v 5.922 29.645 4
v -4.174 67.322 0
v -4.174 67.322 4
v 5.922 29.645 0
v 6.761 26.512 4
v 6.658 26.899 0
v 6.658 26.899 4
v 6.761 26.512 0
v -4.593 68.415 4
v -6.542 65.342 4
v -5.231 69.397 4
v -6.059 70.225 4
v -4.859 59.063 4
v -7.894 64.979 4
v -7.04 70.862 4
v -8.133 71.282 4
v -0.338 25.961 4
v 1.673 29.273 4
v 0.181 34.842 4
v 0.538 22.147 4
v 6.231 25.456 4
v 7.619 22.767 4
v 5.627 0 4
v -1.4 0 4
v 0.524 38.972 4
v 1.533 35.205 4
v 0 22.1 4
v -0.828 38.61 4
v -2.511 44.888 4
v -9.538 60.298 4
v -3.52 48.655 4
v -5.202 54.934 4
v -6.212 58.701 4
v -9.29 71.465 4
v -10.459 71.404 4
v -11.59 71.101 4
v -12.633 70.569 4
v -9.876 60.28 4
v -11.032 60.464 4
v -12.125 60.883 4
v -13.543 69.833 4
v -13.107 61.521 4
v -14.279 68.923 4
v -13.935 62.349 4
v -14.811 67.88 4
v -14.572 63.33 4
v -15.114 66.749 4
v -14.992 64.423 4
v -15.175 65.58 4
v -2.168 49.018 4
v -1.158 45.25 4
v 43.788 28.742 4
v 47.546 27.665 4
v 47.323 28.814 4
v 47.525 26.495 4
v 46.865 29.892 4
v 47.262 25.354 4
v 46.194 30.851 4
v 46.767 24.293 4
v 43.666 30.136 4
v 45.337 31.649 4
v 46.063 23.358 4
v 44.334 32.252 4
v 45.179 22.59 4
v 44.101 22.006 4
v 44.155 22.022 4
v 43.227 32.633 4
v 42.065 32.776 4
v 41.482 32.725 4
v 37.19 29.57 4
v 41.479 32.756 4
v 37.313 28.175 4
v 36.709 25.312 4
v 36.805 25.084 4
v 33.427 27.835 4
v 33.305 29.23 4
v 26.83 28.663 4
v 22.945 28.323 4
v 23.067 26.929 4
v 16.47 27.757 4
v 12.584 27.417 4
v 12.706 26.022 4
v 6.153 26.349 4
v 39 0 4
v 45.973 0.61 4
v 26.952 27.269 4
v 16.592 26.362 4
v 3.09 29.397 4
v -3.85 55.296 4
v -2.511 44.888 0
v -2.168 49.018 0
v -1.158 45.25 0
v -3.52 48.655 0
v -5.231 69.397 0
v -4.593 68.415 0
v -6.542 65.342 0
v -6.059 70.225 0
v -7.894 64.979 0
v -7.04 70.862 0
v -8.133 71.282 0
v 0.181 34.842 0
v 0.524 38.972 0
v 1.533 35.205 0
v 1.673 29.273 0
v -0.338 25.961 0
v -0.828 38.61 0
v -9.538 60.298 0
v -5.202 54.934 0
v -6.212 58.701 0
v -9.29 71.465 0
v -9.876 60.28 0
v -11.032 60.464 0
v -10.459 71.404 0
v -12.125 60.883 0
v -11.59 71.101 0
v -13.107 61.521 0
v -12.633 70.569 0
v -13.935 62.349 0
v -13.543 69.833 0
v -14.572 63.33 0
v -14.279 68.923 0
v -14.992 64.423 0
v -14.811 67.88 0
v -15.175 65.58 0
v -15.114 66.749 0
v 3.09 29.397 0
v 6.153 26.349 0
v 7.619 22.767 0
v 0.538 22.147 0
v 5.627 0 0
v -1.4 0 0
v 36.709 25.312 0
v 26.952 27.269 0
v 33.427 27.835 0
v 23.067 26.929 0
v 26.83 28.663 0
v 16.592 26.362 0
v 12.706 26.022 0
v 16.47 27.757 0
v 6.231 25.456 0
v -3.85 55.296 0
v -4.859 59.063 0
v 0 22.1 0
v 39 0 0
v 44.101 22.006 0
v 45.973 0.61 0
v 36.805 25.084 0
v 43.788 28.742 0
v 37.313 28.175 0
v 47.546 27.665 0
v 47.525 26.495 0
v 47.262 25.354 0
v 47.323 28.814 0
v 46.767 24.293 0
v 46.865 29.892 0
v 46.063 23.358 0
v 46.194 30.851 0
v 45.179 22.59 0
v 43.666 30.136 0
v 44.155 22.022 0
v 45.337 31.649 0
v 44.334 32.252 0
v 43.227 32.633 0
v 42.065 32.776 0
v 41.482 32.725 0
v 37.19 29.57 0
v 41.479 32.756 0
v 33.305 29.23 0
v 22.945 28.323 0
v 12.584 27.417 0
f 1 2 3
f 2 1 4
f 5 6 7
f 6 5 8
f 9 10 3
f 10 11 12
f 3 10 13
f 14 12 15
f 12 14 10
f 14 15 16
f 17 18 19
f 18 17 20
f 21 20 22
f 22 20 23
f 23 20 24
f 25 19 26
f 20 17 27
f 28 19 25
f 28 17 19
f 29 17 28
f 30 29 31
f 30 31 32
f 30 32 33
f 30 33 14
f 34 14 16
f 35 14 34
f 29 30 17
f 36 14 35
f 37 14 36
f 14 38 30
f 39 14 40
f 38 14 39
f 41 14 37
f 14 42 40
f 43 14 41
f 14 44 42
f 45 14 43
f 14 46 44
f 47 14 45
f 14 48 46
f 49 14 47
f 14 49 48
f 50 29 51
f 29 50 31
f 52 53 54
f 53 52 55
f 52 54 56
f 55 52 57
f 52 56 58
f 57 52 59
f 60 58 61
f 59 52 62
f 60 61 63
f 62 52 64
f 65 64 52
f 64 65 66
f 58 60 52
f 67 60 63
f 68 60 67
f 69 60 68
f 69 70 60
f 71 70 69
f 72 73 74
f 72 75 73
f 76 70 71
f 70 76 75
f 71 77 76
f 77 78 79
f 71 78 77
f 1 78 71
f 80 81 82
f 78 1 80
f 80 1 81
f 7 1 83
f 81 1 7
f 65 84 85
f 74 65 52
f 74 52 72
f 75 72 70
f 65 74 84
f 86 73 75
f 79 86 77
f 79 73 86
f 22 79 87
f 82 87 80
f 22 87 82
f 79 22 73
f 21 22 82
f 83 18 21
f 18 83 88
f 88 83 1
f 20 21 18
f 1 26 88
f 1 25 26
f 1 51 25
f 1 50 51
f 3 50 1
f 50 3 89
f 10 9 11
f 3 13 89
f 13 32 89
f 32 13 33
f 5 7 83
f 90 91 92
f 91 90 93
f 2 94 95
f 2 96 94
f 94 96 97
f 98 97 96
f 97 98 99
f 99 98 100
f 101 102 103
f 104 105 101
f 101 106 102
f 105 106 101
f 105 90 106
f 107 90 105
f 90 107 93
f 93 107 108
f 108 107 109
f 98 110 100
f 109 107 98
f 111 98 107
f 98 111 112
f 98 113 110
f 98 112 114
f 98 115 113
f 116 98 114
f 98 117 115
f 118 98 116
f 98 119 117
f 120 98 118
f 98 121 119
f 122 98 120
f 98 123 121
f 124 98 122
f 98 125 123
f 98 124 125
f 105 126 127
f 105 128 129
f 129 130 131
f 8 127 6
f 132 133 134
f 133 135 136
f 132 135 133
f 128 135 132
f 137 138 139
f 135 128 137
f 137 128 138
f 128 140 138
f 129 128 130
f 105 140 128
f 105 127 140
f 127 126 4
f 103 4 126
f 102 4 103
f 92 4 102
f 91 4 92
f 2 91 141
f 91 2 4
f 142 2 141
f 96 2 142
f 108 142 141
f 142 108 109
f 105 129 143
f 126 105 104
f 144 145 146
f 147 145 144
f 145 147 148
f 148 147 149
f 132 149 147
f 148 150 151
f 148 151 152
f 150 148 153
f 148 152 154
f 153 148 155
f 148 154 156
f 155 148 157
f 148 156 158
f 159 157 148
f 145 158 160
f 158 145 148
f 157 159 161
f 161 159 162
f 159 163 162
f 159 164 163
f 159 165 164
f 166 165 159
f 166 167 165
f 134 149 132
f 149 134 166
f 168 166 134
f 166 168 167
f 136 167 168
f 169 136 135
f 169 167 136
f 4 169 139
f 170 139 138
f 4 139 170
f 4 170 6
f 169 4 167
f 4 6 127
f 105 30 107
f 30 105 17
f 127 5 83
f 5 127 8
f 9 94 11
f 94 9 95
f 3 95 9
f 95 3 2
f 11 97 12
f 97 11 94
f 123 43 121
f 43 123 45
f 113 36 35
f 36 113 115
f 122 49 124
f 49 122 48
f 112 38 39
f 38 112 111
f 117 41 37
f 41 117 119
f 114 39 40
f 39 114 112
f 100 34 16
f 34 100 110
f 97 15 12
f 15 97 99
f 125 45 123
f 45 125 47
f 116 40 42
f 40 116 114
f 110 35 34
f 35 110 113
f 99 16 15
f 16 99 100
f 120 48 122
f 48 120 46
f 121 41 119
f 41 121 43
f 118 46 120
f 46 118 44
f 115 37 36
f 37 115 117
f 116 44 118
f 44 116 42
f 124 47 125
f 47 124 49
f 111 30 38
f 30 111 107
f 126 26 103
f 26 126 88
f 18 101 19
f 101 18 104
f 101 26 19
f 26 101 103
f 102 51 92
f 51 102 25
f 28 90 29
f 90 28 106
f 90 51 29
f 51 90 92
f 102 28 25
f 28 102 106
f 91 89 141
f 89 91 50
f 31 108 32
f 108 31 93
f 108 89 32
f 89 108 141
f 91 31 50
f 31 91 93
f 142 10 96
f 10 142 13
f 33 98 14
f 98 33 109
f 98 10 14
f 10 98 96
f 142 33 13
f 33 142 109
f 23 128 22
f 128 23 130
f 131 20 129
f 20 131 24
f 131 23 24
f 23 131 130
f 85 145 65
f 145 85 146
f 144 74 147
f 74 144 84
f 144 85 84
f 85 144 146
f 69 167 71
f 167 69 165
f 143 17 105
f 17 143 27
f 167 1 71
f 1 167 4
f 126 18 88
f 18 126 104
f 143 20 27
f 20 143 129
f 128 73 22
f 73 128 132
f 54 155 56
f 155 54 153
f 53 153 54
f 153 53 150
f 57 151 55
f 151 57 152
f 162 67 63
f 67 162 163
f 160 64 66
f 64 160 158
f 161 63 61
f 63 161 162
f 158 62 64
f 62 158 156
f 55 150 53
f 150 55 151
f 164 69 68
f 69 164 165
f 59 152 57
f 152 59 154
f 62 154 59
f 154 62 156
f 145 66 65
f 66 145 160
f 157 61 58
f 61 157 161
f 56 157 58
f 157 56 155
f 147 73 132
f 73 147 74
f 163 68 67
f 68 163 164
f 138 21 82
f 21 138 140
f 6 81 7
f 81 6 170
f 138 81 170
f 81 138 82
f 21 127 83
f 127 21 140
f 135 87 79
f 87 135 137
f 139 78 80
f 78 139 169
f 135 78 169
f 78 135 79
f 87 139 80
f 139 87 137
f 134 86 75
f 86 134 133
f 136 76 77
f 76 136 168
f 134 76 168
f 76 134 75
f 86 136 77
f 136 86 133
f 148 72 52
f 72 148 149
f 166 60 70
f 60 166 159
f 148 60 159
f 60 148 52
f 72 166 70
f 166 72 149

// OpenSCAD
// Park bench ends for coffee stirers
//
//  Copyright 2012 John Cooper 
//
//  This program is free software: you can redistribute it and/or modify
//  it under the terms of the GNU General Public License as published by
//  the Free Software Foundation, either version 3 of the License, or
//   (at your option) any later version.
//
//  This program is distributed in the hope that it will be useful,
//  but WITHOUT ANY WARRANTY; without even the implied warranty of
//  MERCHANTABILITY or FITNESS FOR A PARTICULAR PURPOSE.  See the
//  GNU General Public License for more details.
//
//  You should have received a copy of the GNU General Public License
//  along with this program.  If not, see <http://www.gnu.org/licenses/>.

// Add some smoothing
$fs=0.2;

// Stirer dimentions
st_w=6.5;
st_h=1.4;

// Some useful numbers
height=4;

module back() {
  translate([0, st_w * 3.8, 0]) {
    rotate([0, 0, 15]) {
      difference() {
        back_shape();
        back_holes();
      }
    }
  }
}

module back_shape() {
  union() {
    cube([st_h * 5, st_w * 6.5, height]);
    translate([st_h, st_w * 6.5,0]){
      cylinder(r=st_h * 4, h=height);
    }
  }
}

module back_holes() {
  for ( l = [0,1,2,3] ) {
    translate([st_h * 2, st_w * ( 1.6 * l + 0.5 ), -0.5]) {
        cube([st_h, st_w, height+1]);
      }
    }
}


module leg_back() {
  difference() {
    translate([-st_h, 0, 0]) {
      rotate([0, 0, -5]) {
        cube([st_h * 5, st_w * 3.8, height]);
      }
    }
    // Cut the bottom of the leg off flat
    translate([-st_w * 2, -st_w * 4, -height]) {
      cube([st_w * 4, st_w * 4,height * 3]);
    }
  }
}
module leg_front() {
  difference() {
    translate([st_w * 6, 0, 0]) {
      rotate([0, 0, 5]) {
        cube([st_h * 5, st_w * 4, height]);
      }
    }
    translate([st_w * 4, -st_w * 4, -height]) {
      cube([st_w * 4, st_w * 4,height * 3]);
    }
  }
}
module seat() {
  translate([0, st_w * 3.4, 0]) {
    rotate([0, 0, 5]) {
      difference() {
        seat_shape();
        translate([st_w * 0.5, st_h * 5 ,0]) {
          rotate([0,0,-90]) {
            back_holes();
          }
        }
      }
    }
  }
}

module seat_shape() {
      cube([st_w * 6.5, st_h * 5, height]);
      translate([st_w * 6.5, st_h * 1, 0]) {
        cylinder(r=st_h * 4, h=height);
      }
}

module part() {
  union(){
    back();
    leg_back();
    leg_front();
    seat();
  }
}


part();
